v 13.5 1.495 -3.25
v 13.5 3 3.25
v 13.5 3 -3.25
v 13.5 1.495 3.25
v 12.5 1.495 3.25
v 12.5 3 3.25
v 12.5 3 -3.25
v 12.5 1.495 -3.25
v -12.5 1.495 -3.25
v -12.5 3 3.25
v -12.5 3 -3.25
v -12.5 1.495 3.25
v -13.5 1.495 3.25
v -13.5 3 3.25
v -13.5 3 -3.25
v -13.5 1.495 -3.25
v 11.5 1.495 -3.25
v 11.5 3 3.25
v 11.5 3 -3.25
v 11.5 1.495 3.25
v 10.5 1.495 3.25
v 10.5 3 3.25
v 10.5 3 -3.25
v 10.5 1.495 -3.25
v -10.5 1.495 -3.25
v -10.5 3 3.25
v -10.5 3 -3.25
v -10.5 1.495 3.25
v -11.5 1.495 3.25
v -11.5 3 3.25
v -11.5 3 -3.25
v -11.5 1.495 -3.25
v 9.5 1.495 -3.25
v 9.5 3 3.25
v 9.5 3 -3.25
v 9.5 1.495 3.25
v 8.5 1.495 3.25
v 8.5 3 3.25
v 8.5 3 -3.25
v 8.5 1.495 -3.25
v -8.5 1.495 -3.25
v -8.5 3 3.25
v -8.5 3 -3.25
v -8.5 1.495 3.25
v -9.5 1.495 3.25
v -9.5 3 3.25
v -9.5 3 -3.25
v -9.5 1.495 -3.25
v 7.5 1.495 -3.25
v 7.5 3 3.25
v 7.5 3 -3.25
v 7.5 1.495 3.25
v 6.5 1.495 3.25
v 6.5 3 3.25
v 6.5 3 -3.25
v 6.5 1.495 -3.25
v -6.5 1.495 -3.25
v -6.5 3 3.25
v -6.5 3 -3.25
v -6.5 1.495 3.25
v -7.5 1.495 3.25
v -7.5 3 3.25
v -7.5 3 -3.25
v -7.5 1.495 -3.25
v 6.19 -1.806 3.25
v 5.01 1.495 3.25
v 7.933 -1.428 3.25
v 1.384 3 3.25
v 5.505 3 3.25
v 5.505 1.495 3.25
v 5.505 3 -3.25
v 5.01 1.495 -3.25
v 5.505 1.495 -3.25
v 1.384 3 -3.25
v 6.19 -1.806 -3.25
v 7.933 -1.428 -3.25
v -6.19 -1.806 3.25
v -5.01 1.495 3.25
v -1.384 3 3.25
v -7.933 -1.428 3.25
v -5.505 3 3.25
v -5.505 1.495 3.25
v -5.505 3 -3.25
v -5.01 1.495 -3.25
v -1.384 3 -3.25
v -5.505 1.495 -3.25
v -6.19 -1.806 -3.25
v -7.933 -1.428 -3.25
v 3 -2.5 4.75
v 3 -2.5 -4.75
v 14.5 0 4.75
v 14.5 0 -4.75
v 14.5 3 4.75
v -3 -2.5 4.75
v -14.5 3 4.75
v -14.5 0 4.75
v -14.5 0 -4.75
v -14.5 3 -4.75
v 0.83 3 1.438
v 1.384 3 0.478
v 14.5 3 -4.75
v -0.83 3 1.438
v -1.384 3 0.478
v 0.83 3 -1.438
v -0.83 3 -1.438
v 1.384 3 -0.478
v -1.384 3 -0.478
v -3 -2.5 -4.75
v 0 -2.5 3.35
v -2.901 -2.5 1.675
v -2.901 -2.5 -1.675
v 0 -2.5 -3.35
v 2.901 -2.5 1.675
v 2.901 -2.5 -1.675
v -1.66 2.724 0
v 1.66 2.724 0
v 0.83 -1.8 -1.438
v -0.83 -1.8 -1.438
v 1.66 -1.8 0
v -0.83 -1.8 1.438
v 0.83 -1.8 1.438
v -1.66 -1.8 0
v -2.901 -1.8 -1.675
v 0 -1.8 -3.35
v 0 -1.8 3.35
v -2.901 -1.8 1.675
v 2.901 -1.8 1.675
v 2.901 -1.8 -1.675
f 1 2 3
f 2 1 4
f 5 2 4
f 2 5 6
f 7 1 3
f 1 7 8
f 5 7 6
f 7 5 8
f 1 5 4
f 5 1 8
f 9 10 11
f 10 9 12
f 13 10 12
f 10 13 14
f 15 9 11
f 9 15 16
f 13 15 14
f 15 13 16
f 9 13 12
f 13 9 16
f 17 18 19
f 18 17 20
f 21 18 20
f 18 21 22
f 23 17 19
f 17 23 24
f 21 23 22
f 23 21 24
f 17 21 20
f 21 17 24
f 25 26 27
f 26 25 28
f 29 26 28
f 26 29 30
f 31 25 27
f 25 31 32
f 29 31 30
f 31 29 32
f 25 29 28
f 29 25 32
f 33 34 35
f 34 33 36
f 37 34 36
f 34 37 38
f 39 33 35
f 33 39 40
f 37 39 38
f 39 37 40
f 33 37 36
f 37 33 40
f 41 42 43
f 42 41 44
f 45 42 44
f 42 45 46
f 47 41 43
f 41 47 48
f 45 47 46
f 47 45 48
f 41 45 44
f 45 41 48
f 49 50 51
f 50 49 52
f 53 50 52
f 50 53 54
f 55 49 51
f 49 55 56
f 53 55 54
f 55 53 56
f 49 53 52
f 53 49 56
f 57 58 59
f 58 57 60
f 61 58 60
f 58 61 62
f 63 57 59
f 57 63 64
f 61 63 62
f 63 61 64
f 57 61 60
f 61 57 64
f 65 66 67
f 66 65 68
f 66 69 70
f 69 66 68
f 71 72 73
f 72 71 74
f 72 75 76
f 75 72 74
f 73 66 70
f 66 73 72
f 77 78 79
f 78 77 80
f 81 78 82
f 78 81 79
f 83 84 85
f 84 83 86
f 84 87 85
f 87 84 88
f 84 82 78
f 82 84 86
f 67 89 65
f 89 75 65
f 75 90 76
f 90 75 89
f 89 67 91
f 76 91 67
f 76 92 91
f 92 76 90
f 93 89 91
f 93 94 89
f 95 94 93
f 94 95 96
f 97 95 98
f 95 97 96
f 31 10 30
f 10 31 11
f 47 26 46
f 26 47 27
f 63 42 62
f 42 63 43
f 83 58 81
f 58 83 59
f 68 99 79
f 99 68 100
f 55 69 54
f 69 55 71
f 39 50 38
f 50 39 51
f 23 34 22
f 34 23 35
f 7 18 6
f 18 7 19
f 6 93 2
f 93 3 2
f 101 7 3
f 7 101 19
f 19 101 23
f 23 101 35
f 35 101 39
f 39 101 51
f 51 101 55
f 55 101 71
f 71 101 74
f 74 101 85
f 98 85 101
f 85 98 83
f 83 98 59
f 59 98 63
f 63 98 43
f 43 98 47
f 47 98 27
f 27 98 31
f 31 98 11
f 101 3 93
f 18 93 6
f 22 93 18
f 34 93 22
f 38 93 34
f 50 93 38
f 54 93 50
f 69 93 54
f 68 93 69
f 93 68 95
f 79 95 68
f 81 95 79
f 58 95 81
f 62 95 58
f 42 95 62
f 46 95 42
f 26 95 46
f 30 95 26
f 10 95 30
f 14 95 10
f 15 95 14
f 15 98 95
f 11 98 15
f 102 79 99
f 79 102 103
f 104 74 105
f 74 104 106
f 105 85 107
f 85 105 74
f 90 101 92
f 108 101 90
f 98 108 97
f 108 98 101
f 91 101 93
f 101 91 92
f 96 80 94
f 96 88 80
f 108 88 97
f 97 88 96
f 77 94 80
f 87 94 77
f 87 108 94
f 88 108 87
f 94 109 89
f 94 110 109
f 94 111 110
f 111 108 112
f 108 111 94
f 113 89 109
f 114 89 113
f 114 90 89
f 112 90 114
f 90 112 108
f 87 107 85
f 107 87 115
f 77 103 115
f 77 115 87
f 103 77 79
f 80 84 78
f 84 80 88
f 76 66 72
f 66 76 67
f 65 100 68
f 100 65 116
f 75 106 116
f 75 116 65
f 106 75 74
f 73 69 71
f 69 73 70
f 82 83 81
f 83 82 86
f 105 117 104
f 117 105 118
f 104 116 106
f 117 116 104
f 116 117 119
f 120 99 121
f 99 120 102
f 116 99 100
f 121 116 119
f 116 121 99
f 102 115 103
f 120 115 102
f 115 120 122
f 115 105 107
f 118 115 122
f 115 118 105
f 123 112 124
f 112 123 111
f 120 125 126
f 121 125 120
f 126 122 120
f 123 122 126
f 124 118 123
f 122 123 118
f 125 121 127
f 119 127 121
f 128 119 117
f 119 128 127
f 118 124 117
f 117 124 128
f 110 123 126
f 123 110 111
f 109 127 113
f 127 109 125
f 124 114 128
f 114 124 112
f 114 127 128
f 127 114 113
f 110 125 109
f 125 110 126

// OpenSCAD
// Tough Belt Clip
// Design by Marius Gheorghescu, December 2013


// how many teeth on each side
teeth = 5;

// width of the belt in mm incl clearance (use 6.25 for typical GT2 belt)
belt_width = 6.5;

// thickness of the belt in mm (use 1.5 for GT2 belt)
belt_thickness = 1.5;

// belt pitch in mm (use 2.0 for GT2 belt)
pitch = 2.0;

// this controls the strength of the bracket 
shell = 1.5;

/* [Hidden] */
cutout_width = 6 + belt_thickness + shell;
len = 2*teeth*pitch + cutout_width;
round_corner_epsilon = 1;
epsilon = 0.01;


module belt()
{
	// reinforcement
	//cube([len, 2, h], center=true);

	for(i=[pitch/4:pitch:len]) {
		translate([i-len/2, 1.25, 0])
			cube([pitch - round_corner_epsilon, belt_thickness + round_corner_epsilon, belt_width], center=true);

	}

}



module clip() {
difference()  {

	union() {
		// general shape of the clip
		linear_extrude(belt_width + 2*shell, center=true) {
			polygon(points=[
				[len/2,0],
				[3,-2.5], 
				[-3,-2.5], 
				[-len/2,0], 
				[-len/2, shell + belt_thickness], 
				[len/2, shell + belt_thickness]
			]);
		}


		
	}

	// left belt turn
	rotate([0,0,-45])
	translate([-3.2/2 - shell - belt_thickness/2,0,0])
		cube([belt_thickness, 20 + 2*shell, belt_width], center=true);

	// right belt turn
	rotate([0,0,45])
//+ belt_thicknes/2 + shell
	translate([3.2/2 + shell + belt_thickness/2,0,0])
		cube([belt_thickness, 20 + 2*shell, belt_width], center=true);

	// cutouts
	translate([len/2 - teeth*pitch, shell + belt_thickness/2, 0])
		cube([pitch + epsilon, belt_thickness + epsilon, belt_width], center=true);

	translate([-len/2 + teeth*pitch, shell + belt_thickness/2, 0])
		cube([pitch + epsilon, belt_thickness + epsilon, belt_width], center=true);


	// m3 hole
	rotate([90,0,0])
		cylinder(r=1.66, h=10 + 2*shell, center=true);

	// hex nut
	translate([0, -3.8, 0])
	rotate([90,90,0])
		cylinder(r=3.35, h=4, center=true, $fn=6);

	// belt teeth
	for(i=[1:1:teeth]) {

		// left side
		color([1,0, 0])
		translate([len/2 + pitch/4 - i*pitch, shell + belt_thickness/2, 0])
			cube([pitch/2, belt_thickness + epsilon, belt_width], center=true);

		// right side 
		color([1,0, 0])
		translate([-len/2 - pitch/4 + i*pitch, shell + belt_thickness/2, 0])
			cube([pitch/2, belt_thickness + epsilon, belt_width], center=true);
	}

}


}


module clip_set()
{
	for(i=[0:10:50]) {
		translate([0,i,0])
			clip();
	}
}

//clip_set();
clip();
